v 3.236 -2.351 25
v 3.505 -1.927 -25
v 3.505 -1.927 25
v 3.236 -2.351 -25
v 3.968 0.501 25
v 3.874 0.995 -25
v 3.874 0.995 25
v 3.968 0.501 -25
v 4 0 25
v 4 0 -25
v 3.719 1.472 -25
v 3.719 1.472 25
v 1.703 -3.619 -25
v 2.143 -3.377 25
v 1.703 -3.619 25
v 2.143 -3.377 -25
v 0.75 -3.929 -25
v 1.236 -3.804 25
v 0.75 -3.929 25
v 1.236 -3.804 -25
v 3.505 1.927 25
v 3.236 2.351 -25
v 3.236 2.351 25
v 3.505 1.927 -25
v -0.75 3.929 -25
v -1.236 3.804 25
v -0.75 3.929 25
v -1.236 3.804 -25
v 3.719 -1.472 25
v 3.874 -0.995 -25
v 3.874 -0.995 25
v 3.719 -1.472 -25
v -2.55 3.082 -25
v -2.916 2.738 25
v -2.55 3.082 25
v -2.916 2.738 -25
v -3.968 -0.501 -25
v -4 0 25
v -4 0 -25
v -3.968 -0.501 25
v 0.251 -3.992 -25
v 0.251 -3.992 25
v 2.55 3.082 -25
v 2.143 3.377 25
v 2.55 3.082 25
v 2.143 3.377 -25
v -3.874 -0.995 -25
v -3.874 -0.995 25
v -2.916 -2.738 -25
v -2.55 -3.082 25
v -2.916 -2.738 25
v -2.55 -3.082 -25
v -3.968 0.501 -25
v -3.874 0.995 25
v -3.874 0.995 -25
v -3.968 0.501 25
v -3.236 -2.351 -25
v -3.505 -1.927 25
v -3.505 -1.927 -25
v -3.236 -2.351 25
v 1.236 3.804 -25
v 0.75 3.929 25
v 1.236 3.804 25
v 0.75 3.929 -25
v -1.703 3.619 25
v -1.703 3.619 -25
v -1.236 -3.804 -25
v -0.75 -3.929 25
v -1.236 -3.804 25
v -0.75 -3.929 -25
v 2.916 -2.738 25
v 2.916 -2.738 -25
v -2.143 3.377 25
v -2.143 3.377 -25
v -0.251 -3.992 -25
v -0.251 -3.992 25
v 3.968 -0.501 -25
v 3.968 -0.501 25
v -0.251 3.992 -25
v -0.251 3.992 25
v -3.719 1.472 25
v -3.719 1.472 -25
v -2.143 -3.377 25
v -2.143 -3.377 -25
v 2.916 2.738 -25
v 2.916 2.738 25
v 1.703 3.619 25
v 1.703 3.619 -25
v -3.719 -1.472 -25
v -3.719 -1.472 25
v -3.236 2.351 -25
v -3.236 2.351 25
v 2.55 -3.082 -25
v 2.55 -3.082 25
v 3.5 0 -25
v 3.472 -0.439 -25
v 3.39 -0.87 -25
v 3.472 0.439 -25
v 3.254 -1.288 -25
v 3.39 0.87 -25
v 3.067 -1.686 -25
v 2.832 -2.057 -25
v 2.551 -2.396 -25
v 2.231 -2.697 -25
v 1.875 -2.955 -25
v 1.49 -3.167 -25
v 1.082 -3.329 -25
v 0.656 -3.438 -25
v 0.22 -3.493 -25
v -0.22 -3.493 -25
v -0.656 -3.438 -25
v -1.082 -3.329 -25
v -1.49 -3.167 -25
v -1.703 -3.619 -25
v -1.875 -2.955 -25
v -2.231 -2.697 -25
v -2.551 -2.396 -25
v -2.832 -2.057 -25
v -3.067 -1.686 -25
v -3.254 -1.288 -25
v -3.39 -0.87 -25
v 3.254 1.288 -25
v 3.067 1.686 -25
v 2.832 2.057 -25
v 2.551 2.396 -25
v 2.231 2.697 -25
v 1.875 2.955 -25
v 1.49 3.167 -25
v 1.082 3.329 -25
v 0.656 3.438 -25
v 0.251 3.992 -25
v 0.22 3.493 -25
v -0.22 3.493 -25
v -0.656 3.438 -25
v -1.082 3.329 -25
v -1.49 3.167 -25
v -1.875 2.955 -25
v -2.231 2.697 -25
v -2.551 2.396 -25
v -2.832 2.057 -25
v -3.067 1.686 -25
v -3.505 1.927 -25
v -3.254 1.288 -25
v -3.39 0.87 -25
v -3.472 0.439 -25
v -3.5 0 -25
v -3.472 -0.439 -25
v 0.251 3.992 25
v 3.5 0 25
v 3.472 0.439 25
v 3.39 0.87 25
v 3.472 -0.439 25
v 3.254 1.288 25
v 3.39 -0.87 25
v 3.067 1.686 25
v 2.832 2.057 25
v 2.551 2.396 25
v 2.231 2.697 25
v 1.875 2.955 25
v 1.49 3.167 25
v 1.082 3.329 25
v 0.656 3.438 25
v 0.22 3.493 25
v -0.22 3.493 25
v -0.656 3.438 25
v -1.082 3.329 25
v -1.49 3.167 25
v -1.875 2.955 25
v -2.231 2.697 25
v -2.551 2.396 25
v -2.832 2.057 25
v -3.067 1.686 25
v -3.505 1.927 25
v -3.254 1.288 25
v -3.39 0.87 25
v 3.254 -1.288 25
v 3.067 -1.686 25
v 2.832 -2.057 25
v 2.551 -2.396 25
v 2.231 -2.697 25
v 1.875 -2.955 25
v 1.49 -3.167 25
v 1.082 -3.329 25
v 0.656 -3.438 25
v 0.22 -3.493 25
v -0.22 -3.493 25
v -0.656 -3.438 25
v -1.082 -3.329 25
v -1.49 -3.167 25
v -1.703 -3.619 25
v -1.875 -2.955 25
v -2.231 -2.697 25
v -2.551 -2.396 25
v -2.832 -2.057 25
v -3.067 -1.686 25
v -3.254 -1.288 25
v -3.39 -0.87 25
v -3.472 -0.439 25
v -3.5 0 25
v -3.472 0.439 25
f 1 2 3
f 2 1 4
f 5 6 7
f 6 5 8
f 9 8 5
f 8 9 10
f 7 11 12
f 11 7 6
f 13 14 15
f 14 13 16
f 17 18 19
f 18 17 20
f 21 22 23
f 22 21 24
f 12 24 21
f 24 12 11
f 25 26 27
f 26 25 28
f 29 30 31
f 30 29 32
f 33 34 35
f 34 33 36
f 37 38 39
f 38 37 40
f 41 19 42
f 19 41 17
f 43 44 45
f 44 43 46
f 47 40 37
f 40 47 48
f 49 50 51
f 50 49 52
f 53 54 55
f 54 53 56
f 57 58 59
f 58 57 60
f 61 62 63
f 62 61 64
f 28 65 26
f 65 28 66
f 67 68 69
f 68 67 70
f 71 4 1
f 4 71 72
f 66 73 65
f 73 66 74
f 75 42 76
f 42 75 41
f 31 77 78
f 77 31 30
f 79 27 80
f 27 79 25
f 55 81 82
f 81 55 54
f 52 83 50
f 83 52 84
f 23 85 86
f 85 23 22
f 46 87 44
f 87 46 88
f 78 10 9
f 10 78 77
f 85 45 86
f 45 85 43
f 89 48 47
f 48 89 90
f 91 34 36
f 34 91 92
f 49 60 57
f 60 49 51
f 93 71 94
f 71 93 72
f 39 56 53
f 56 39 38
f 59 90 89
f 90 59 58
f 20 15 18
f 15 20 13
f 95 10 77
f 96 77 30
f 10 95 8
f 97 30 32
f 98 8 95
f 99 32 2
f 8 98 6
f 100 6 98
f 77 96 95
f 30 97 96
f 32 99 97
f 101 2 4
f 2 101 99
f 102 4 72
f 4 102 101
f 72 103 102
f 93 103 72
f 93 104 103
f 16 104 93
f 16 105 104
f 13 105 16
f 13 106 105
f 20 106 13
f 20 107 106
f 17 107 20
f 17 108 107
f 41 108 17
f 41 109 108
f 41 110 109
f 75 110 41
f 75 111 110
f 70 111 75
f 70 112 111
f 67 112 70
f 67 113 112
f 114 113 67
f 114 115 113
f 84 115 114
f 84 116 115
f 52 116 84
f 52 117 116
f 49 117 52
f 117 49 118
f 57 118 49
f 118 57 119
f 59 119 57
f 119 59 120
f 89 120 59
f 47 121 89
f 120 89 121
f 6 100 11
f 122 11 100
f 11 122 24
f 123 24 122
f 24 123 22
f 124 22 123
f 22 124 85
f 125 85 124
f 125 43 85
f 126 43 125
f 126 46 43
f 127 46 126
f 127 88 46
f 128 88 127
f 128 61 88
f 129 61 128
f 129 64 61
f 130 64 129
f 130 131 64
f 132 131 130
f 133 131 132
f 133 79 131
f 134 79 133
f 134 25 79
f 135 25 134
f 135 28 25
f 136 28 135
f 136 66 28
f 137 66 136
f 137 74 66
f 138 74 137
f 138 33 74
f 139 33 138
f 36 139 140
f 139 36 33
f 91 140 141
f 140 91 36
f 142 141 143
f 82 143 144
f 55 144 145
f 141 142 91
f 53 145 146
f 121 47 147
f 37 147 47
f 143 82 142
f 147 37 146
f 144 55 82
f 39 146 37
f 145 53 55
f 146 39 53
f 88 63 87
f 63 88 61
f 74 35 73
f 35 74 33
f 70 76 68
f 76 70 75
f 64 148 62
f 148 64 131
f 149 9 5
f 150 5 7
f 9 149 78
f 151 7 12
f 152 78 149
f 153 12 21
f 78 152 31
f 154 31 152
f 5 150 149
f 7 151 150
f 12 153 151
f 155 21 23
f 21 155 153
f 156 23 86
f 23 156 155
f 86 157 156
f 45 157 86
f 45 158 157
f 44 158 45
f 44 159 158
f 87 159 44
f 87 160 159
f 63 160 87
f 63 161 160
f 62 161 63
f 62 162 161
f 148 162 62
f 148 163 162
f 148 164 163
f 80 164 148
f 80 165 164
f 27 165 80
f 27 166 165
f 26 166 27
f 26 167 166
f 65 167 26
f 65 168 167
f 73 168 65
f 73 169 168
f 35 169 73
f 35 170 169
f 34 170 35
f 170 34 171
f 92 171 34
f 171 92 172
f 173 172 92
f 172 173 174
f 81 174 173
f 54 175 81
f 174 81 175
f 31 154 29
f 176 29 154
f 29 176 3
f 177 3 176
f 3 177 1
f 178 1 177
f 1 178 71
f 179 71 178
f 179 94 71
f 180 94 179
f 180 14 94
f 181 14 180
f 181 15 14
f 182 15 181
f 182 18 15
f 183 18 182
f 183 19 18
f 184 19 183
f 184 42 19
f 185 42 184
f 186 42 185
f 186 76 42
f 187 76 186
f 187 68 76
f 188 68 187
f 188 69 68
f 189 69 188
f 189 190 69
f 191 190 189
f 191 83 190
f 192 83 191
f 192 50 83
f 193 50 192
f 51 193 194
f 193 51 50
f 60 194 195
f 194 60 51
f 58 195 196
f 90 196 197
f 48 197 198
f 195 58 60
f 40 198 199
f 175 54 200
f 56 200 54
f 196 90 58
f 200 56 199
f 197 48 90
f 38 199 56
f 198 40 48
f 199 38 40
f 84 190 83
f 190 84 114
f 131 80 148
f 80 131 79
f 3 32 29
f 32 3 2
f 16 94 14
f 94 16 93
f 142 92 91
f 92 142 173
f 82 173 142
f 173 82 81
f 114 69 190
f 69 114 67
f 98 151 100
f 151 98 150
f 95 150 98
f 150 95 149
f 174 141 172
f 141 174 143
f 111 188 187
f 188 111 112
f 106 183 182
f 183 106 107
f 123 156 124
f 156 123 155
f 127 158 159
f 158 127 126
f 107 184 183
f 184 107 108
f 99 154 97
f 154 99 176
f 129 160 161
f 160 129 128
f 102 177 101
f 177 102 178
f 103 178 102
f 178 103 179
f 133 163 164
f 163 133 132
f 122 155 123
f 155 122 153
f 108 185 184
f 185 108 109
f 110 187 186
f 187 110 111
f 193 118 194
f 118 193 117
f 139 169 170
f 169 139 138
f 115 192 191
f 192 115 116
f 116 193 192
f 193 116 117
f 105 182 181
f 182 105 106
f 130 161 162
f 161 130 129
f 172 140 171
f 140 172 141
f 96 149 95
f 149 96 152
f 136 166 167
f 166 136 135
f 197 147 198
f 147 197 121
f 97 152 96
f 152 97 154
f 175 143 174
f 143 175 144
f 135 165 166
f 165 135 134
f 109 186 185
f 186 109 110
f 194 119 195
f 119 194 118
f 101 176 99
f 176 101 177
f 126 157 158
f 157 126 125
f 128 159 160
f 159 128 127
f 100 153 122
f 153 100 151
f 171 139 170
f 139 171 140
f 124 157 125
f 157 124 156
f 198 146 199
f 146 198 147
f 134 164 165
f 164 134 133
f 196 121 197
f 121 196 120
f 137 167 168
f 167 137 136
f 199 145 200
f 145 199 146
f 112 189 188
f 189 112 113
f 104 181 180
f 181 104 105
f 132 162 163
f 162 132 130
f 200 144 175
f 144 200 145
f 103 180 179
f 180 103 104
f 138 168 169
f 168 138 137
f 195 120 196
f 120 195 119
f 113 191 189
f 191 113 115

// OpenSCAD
$fn = 50;


difference() {
	union() {
		translate(v = [0, 0, -25.0000000000]) {
			cylinder(h = 50, r = 4.0000000000);
		}
	}
	union() {
		translate(v = [0, 0, -100.0000000000]) {
			cylinder(h = 200, r = 3.5000000000);
		}
	}
}
